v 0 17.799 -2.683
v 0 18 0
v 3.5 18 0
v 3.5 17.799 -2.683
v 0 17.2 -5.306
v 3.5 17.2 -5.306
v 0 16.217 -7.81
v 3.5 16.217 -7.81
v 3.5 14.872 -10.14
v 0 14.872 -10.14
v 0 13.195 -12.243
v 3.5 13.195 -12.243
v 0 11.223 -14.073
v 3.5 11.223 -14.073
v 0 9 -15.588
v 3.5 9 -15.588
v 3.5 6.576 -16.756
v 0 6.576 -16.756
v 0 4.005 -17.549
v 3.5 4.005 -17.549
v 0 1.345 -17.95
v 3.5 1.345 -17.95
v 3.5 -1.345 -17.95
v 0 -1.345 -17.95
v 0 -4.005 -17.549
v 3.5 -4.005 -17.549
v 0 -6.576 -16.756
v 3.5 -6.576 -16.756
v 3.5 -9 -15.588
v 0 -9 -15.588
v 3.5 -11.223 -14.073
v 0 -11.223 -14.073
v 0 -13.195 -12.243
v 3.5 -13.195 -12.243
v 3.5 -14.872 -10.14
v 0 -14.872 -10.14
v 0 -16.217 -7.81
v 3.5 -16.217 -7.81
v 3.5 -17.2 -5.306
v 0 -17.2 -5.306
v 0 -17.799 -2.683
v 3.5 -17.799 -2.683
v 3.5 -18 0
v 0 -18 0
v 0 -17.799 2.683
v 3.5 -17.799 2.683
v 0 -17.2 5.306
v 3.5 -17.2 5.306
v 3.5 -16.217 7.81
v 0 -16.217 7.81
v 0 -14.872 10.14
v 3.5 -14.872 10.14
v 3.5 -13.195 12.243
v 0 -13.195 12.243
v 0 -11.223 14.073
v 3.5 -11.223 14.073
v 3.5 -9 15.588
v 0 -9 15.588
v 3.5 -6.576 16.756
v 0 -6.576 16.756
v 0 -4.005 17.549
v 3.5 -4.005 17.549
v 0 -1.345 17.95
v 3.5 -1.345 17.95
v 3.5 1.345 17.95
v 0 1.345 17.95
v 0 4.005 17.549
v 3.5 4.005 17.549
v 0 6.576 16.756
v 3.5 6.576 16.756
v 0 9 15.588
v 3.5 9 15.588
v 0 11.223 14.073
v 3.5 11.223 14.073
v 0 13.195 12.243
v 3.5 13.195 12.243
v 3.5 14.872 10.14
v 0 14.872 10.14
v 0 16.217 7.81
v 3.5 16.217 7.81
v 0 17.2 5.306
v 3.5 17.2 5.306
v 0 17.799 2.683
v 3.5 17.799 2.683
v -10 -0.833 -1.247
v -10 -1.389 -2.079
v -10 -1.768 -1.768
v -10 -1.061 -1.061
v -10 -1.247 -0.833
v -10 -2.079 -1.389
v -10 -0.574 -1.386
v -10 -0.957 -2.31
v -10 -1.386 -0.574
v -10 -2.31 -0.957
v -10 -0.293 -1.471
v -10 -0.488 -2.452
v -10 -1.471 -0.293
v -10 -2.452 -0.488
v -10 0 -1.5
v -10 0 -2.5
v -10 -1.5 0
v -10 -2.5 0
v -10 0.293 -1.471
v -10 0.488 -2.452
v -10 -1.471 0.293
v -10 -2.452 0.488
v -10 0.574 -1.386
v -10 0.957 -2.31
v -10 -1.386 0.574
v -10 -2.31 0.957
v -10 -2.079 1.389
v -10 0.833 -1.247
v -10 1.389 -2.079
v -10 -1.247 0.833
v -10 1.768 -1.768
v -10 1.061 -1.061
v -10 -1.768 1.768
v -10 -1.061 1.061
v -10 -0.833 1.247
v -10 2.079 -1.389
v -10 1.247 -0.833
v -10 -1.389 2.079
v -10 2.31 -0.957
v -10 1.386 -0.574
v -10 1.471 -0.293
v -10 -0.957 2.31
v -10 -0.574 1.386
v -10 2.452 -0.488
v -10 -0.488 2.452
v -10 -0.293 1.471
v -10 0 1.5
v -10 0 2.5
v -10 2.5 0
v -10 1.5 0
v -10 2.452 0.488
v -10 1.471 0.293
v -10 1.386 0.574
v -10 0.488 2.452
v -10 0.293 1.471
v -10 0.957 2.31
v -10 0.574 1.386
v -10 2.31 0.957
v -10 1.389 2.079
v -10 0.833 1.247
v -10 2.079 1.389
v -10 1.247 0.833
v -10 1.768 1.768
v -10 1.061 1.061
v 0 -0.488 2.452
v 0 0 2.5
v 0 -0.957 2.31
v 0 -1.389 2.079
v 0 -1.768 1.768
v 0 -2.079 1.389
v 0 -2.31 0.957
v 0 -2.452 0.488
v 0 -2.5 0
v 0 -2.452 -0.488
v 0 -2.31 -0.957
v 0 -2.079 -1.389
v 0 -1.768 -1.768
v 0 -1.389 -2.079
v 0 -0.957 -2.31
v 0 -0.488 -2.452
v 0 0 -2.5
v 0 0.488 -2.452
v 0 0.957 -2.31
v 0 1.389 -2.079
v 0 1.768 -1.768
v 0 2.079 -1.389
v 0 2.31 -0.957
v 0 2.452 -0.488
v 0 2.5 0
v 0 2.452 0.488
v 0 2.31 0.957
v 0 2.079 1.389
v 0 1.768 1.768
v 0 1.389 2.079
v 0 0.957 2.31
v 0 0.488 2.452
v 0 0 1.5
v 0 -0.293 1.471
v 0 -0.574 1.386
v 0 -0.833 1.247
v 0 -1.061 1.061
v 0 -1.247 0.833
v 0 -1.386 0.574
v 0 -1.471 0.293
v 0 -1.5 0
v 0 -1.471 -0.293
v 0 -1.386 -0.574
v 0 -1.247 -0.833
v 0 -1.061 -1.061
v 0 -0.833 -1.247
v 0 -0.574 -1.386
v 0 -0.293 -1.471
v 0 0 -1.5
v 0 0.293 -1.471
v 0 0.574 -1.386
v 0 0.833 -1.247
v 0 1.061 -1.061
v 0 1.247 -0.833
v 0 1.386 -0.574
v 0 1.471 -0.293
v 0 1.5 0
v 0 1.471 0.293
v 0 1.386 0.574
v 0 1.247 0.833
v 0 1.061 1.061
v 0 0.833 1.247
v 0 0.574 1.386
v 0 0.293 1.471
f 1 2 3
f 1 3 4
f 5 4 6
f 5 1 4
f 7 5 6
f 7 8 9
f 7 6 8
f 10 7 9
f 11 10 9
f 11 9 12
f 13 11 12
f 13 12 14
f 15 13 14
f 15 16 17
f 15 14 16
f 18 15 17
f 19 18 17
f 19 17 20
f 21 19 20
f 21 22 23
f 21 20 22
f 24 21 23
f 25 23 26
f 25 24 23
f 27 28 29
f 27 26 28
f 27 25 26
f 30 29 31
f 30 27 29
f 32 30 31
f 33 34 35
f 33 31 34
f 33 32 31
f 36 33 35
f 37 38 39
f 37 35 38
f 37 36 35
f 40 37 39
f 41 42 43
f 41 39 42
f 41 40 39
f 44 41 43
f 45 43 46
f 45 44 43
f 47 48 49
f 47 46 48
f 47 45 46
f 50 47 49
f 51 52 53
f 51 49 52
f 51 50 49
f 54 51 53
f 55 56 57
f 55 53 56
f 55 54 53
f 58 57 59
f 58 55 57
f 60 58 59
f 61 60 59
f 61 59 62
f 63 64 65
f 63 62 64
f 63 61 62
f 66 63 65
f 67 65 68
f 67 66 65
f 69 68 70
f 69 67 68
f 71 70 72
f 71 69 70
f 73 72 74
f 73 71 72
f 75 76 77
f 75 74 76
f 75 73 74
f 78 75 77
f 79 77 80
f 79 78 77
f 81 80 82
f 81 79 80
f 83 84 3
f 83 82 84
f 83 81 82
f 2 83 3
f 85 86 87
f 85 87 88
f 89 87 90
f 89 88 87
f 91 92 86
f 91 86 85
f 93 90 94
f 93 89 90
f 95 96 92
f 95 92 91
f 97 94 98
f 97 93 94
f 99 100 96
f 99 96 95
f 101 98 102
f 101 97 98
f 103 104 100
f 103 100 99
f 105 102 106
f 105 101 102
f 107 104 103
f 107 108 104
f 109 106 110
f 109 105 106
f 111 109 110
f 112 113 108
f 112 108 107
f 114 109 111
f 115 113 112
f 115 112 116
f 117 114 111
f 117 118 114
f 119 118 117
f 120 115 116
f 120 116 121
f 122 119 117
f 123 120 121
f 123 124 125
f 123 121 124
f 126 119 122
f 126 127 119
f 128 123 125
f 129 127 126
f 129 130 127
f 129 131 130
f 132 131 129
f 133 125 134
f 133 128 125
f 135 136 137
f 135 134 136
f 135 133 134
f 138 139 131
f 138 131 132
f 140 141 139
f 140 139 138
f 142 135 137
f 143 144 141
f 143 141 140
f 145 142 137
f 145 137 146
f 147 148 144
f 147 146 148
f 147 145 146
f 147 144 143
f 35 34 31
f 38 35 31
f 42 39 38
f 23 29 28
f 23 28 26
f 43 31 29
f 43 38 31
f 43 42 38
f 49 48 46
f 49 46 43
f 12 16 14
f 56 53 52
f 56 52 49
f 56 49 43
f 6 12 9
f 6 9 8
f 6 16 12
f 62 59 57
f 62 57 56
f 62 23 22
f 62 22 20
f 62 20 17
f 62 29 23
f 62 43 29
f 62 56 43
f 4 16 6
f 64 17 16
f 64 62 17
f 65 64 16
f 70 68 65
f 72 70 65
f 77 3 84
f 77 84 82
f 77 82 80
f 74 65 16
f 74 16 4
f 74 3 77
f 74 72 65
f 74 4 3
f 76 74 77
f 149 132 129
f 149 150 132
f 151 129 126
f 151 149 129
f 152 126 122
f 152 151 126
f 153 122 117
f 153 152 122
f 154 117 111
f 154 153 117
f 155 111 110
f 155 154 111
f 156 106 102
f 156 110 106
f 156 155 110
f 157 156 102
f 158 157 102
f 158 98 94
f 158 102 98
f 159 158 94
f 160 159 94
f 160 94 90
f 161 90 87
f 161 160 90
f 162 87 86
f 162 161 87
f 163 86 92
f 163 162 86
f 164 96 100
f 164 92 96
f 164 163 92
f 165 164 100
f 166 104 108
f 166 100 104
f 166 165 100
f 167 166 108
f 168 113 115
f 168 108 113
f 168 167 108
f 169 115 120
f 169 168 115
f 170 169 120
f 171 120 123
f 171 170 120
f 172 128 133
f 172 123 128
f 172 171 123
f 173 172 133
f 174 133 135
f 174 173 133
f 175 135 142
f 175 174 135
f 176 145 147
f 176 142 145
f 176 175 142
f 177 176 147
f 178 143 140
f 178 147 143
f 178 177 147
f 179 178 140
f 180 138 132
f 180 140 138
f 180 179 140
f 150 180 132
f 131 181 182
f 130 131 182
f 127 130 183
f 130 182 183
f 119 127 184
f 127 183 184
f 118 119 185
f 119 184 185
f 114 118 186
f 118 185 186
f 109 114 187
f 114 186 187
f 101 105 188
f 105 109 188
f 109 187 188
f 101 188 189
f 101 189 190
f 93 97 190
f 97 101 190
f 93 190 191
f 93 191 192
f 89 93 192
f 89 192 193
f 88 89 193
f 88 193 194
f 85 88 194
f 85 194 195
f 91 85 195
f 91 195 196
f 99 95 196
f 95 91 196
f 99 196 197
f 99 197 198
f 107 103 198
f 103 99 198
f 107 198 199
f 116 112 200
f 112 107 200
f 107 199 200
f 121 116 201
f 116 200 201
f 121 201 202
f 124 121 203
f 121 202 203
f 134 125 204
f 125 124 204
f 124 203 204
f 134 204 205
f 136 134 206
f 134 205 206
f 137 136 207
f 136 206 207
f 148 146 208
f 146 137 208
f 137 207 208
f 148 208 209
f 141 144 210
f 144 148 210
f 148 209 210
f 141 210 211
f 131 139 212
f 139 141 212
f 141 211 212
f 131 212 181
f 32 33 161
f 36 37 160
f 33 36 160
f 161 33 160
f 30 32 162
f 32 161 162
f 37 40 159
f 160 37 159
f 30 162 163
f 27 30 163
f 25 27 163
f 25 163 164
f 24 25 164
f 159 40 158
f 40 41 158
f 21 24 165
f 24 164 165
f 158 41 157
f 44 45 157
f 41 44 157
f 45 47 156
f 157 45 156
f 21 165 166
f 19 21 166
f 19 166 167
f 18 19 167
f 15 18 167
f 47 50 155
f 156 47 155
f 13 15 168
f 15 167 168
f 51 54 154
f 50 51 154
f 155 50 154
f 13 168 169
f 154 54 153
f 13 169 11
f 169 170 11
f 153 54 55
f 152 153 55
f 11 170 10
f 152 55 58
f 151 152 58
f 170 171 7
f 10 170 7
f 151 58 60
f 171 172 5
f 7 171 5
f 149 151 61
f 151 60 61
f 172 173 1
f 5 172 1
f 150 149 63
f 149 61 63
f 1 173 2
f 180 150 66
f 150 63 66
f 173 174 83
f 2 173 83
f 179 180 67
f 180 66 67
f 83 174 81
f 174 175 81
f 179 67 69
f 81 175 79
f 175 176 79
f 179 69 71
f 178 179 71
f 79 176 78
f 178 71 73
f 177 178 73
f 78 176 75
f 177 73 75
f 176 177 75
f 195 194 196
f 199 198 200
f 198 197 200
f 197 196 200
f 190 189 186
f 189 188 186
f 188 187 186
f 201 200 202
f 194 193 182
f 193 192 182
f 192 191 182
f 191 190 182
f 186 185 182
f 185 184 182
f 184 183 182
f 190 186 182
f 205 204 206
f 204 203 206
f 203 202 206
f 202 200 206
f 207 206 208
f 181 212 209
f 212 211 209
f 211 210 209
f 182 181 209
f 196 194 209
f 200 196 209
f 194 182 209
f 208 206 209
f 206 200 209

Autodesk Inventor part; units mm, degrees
ref_plane "YZ Plane" through (0, 0, 0) normal (1, 0, 0) x (0, 1, 0)
ref_plane "XZ Plane" through (0, 0, 0) normal (0, 1, 0) x (-1, 0, 0)
ref_plane "XY Plane" through (0, 0, 0) normal (0, 0, 1) x (1, 0, 0)
sketch "スケッチ1" plane through (0, 0, 0) normal (1, 0, 0) x (0, 1, 0)
  circle A0 centre (0, 0) radius 18
  dimension "d0" = 36
extrude "押し出し1" add sketch "スケッチ1" along normal blind 3.5
sketch "スケッチ2" plane through (0, 0, 0) normal (-1, 0, 0) x (0, 0, 1)
  circle A0 centre (0, 0) radius 1.5
  circle A1 centre (0, 0) radius 2.5
  dimension "d3" = 3
  dimension "d4" = 5
extrude "押し出し2" add sketch "スケッチ2" along normal blind 10
properties part number "tire" material "ゴム"
